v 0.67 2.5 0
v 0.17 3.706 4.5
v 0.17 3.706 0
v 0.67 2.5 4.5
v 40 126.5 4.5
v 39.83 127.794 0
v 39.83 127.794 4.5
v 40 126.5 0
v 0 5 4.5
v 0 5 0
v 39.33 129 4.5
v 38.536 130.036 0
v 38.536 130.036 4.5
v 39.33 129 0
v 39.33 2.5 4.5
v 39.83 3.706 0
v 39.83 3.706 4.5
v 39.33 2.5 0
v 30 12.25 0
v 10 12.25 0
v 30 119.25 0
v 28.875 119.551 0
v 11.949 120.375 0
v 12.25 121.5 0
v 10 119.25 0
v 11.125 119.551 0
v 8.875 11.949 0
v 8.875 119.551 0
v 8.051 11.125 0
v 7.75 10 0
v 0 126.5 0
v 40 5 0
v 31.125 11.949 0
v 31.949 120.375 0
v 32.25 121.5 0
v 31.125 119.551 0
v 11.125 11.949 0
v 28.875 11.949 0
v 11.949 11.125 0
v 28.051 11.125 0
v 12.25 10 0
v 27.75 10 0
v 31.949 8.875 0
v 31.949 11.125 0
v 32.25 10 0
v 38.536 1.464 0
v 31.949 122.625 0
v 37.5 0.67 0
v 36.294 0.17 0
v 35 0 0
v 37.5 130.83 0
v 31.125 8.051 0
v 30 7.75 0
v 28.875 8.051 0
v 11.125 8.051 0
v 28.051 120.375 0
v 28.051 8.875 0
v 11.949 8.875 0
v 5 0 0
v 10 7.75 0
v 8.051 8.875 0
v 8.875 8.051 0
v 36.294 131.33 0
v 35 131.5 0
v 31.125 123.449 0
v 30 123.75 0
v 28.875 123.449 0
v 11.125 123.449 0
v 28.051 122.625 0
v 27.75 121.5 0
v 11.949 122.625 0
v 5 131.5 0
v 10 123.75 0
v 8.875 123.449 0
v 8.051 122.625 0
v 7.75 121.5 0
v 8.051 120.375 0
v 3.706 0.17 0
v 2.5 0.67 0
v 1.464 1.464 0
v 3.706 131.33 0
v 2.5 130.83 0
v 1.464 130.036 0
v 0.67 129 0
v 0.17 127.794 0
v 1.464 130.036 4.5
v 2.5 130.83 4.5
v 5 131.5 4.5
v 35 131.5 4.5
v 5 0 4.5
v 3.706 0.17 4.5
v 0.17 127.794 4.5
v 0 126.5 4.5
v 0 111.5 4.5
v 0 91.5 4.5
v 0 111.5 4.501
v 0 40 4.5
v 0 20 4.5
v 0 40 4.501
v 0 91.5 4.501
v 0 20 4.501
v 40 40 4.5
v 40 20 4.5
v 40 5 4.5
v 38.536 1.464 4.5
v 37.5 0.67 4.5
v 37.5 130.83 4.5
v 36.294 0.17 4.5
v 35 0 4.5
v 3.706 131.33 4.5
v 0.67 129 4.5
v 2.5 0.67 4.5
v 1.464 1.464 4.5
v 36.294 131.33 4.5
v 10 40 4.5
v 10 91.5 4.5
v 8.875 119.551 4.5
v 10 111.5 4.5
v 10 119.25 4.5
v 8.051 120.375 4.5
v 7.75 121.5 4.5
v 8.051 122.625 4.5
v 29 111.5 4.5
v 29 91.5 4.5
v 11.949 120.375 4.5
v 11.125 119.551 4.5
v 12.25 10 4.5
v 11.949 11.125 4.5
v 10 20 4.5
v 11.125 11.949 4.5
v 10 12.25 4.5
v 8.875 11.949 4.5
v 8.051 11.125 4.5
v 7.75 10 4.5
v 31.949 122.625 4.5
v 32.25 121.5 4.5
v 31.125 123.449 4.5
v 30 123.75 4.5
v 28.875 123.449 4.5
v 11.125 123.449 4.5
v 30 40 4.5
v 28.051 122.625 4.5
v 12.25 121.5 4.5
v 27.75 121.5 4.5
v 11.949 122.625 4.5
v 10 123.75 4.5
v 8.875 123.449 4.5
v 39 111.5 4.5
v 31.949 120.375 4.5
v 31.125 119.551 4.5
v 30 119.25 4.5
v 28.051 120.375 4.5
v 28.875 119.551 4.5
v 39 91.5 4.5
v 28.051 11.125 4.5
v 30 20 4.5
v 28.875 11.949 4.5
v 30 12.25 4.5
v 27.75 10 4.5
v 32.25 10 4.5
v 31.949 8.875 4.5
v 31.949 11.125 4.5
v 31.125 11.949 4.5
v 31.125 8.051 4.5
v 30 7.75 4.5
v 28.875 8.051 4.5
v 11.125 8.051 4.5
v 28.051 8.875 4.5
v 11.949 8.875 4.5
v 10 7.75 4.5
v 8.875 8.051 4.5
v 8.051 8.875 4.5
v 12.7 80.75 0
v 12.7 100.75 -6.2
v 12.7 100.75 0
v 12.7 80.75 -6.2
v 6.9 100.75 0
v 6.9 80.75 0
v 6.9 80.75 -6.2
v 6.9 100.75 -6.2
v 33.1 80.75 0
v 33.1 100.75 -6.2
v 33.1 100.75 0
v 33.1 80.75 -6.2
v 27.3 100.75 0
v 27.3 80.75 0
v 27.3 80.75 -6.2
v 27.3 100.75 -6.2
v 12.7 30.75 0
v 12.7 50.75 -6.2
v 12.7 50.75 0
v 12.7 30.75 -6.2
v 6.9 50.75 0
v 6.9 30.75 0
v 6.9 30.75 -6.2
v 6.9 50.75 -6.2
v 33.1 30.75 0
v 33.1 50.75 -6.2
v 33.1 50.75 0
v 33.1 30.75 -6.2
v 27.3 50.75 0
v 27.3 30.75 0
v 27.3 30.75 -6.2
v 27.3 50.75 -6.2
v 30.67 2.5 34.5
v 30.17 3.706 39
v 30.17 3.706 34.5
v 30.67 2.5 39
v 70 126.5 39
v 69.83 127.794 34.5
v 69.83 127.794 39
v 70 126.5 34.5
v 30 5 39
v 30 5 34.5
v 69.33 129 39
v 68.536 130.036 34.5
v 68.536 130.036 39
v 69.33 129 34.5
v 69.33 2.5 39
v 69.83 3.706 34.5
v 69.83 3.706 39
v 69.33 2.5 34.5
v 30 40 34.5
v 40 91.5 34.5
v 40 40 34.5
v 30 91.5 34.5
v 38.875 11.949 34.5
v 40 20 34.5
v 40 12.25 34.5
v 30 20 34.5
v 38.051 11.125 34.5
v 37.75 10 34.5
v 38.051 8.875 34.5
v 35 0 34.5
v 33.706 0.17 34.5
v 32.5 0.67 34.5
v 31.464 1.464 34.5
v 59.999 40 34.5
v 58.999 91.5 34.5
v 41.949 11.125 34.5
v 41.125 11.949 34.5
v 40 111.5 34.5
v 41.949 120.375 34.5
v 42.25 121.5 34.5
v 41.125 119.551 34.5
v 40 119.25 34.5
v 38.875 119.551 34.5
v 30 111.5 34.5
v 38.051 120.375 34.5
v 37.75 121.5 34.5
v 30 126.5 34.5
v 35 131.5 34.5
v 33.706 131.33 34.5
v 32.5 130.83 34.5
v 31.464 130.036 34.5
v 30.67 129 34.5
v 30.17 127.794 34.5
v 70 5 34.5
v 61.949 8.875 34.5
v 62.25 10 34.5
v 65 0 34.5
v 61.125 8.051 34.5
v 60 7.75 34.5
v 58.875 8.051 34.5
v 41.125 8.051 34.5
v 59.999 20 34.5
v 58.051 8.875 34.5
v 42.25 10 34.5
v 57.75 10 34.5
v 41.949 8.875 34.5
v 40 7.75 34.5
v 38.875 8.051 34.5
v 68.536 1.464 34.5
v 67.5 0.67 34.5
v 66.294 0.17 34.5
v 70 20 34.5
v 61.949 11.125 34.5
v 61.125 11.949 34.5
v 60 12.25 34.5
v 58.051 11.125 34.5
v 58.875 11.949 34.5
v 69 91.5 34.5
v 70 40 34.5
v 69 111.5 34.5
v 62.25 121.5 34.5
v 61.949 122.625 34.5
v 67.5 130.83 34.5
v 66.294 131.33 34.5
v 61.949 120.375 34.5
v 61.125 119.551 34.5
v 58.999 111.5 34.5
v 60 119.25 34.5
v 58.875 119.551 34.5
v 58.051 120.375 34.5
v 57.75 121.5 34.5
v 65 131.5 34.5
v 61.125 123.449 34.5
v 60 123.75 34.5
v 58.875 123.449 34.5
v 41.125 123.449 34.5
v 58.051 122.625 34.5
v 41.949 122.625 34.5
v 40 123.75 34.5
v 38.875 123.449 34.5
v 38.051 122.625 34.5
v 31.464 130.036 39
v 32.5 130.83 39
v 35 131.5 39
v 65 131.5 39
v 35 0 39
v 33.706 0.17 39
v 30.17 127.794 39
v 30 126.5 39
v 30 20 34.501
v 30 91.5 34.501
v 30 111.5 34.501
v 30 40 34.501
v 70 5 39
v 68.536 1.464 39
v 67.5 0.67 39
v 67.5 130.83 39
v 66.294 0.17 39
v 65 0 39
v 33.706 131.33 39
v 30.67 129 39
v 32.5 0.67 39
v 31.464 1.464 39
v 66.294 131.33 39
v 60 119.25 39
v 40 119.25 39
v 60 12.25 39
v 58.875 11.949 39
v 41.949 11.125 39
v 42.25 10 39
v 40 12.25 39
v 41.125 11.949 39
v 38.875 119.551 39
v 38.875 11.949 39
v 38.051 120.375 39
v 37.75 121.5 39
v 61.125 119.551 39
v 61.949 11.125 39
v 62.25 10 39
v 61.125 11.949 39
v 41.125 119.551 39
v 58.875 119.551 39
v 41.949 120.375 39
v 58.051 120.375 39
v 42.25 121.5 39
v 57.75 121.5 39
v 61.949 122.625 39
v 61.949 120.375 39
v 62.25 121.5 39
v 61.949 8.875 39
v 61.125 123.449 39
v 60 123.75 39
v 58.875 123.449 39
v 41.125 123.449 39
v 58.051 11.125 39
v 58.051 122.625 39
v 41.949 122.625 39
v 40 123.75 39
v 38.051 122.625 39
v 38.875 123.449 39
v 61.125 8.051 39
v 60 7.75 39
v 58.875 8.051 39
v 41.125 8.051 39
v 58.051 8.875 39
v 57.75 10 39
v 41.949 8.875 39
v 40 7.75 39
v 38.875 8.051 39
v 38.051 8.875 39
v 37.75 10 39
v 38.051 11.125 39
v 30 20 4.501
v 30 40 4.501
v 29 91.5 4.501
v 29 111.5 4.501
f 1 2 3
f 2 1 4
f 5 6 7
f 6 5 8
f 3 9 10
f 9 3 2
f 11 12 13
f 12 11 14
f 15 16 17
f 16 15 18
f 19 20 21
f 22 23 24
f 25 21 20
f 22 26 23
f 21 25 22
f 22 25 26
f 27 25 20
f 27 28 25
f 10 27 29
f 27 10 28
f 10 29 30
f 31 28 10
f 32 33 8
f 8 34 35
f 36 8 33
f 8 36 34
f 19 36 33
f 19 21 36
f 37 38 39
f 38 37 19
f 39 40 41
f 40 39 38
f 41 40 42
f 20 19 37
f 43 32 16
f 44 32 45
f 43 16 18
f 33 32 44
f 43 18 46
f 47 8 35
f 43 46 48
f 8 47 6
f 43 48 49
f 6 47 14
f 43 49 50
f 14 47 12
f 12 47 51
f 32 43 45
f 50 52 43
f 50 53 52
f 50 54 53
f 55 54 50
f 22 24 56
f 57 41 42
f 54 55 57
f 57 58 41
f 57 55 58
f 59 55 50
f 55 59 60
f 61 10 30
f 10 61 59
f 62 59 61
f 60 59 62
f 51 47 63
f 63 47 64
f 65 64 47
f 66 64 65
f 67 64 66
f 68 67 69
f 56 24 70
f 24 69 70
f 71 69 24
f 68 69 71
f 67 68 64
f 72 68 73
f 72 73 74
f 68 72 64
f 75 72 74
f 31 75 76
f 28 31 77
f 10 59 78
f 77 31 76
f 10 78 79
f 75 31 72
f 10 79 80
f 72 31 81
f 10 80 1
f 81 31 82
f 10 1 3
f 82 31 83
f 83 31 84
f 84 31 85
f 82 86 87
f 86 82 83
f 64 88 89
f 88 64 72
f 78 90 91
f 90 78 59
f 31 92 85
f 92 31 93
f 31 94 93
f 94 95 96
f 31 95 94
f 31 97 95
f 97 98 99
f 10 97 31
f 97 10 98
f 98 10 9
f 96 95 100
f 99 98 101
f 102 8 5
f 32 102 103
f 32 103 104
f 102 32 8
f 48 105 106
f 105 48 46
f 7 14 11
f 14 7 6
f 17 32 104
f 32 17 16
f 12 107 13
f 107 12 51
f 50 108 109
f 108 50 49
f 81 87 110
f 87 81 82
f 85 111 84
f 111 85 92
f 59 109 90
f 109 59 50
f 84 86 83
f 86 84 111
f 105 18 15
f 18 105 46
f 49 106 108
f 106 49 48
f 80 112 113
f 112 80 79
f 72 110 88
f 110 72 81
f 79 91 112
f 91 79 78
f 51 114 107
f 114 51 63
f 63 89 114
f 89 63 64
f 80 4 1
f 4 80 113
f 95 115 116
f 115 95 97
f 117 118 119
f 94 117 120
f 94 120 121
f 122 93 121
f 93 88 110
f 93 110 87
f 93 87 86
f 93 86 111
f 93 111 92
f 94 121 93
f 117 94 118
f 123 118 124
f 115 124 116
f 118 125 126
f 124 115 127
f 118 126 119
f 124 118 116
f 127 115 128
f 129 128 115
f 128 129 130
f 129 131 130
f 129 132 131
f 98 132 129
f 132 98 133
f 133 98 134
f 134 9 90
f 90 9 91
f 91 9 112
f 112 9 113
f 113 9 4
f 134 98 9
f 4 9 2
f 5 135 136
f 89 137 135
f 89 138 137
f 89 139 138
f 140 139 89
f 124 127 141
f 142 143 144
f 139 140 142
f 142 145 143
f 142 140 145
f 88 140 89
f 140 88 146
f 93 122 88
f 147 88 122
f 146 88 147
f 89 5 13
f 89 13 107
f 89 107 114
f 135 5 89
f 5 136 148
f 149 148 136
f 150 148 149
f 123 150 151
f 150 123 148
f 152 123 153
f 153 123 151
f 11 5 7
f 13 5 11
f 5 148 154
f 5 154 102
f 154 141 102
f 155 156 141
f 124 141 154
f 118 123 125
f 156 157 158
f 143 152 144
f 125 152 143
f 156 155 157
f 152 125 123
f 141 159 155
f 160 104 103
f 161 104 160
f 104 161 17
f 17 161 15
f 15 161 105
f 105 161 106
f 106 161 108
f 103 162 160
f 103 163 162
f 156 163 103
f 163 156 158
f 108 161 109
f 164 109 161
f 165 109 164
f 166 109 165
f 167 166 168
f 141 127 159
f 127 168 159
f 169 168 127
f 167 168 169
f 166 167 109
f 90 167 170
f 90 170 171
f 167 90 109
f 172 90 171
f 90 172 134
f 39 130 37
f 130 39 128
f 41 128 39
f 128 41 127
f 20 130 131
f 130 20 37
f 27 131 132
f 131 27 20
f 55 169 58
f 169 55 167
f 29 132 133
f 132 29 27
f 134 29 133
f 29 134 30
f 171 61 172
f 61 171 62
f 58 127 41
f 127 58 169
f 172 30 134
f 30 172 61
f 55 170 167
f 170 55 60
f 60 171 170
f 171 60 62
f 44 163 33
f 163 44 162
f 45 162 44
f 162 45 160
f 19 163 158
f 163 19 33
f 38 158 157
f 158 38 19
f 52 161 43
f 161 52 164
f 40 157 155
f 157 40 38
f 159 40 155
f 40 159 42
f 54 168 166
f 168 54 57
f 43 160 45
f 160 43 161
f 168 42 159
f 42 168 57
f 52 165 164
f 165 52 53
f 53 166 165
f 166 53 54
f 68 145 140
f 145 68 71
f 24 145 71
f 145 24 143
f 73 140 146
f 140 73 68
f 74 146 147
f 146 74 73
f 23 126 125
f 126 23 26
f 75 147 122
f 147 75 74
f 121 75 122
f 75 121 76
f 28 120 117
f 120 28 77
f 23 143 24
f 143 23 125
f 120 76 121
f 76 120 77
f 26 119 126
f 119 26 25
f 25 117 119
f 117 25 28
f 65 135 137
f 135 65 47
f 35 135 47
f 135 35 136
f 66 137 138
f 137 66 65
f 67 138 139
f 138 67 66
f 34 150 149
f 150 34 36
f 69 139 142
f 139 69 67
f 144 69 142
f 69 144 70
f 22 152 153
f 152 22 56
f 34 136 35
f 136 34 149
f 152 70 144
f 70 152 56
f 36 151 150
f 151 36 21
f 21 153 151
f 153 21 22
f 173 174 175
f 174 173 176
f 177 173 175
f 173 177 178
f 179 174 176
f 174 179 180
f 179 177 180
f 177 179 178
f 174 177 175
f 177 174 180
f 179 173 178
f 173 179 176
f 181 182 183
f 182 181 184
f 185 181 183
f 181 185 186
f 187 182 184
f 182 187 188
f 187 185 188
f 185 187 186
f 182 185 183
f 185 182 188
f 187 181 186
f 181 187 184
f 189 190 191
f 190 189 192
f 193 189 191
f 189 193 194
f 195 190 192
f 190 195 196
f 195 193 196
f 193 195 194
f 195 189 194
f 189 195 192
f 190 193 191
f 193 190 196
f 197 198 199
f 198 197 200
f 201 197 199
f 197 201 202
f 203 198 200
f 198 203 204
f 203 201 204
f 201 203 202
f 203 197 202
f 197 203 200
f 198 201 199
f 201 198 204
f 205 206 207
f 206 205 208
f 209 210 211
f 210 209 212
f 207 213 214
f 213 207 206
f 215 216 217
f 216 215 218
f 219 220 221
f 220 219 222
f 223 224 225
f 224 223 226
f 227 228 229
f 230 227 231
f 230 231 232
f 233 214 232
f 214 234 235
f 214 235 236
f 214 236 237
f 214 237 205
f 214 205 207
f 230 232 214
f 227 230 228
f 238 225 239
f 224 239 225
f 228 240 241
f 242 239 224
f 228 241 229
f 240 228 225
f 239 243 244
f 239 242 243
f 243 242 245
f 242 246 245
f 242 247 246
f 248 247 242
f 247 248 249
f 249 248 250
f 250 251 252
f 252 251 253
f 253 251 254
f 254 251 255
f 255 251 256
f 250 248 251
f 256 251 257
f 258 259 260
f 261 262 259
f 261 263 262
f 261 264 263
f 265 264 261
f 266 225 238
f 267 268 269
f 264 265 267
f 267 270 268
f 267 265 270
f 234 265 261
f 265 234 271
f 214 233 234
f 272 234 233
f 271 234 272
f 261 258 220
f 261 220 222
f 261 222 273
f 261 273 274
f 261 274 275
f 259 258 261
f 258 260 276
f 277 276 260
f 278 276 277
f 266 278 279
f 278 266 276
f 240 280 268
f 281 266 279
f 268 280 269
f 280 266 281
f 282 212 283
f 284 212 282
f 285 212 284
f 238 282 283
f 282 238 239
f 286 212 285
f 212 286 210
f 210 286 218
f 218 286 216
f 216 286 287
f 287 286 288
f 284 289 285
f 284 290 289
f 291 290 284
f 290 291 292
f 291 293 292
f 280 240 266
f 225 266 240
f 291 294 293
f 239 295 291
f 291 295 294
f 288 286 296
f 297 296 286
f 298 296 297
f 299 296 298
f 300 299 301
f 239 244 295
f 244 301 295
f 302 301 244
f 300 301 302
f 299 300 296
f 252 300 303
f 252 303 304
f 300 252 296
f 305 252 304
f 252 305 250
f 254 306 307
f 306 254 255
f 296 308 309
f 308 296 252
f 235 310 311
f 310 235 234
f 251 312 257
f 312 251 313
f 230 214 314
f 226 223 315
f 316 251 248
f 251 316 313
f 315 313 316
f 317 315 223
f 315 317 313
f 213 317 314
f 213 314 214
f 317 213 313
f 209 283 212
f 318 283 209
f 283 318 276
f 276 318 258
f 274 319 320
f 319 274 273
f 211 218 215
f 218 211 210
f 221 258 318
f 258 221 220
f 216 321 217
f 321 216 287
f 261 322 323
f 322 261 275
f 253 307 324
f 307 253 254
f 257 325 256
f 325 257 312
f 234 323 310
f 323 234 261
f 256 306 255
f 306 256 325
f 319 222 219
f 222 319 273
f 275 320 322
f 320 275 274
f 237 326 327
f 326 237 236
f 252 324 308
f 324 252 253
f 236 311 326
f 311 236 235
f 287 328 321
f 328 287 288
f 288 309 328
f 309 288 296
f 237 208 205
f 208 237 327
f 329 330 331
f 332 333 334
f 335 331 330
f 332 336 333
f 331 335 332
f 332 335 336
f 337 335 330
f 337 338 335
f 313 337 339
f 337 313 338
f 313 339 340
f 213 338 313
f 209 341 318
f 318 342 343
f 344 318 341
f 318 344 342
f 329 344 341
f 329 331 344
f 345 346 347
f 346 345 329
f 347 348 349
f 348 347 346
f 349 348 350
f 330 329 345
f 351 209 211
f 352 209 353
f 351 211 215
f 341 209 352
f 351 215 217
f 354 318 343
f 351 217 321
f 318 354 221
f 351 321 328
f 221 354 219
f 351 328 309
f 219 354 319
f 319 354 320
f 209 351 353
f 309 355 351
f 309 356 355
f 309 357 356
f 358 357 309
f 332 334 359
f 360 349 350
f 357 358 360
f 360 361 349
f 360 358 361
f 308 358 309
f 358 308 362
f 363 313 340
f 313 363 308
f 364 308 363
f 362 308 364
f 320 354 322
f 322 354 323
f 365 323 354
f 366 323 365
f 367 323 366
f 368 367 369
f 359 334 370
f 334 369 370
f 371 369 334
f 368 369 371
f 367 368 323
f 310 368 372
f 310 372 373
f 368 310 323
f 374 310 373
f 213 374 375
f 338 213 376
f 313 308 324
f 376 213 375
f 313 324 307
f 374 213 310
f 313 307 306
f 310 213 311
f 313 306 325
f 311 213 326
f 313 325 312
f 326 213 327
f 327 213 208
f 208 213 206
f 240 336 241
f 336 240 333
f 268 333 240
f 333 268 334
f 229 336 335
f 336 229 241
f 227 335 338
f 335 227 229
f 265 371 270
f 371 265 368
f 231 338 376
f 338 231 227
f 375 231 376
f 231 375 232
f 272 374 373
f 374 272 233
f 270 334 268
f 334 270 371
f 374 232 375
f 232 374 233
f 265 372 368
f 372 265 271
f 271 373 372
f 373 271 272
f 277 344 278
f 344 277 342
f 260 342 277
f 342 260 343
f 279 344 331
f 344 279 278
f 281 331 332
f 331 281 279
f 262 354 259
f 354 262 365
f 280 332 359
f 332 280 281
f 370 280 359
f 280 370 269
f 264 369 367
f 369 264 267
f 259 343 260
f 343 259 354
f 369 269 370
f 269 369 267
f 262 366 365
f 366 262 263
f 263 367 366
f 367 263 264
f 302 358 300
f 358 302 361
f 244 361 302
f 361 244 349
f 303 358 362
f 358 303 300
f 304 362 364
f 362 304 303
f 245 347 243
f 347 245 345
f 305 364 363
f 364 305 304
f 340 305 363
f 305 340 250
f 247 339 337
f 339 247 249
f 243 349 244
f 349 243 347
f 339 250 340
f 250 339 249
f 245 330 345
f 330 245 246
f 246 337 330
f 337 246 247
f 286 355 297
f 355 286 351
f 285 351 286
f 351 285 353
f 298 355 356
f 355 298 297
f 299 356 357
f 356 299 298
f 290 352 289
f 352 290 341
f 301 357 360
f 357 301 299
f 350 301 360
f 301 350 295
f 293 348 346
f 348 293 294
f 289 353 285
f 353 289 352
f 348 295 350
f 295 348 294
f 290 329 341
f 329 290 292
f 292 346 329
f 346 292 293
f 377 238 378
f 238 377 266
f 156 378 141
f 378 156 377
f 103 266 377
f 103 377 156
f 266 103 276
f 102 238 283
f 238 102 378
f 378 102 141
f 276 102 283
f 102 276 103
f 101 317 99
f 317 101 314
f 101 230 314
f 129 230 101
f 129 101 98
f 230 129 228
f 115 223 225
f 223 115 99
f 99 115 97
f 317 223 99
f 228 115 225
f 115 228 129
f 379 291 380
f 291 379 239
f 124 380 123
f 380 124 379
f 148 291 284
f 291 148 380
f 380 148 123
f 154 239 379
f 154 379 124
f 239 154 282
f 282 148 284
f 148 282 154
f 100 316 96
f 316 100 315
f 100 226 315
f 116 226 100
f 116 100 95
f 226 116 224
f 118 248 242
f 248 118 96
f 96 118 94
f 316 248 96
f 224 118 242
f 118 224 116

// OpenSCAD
/* https://www.thingiverse.com/thing:2164045 */
// preview[view:south west, tilt:top diagonal]

// Add prongs to the bottom of the mount for additional stability
use_prongs = "yes"; // [yes:Yes, no:No]

// X-offset of the mount
offset_x = 30;
// Y-offset of the mount
offset_y = 0;
// Z-offset of the mount
offset_z = 30;

// Arm height
arm_height = 20;
// Arm width
arm_width = 10;

// Make M4 holes a bit larger, added to the diameter
m4_hole_adjustment = 0.5;

/* [Hidden] */

alu_w = 20.0;
alu_m = 6.2; // The middle groove of the 2020 extrusion
alu_side_w = (alu_w - alu_m) / 2;

base_w = alu_w * 2;
base_l = 131.5; // TEVO Tarantula i3
base_h =  4.5;

arm_y_margin = 20;

m4_d = 4.0 + m4_hole_adjustment;

extender();

module plate() {
    difference() {
        linear_extrude(height=base_h) rounded_square([base_w, base_l], 5, $fn=24);
        
        hm = alu_side_w + alu_m/2;
        ox = hm;
        oy = 10;
        translate([ox,oy,-1]) cylinder(d=m4_d, h=base_h+2, $fn=12);
        translate([base_w-ox,oy,-1]) cylinder(d=m4_d, h=base_h+2, $fn=12);
        
        translate([ox,base_l-oy,-1]) cylinder(d=m4_d, h=base_h+2, $fn=12);
        translate([base_w-ox,base_l-oy,-1]) cylinder(d=m4_d, h=base_h+2, $fn=12);
    }
}

module extender() {
    plate(); // Base
    
    // Prongs
    if (use_prongs == "yes") {
        translate([0, (base_l)/2, -alu_m]) {
            prongs();
        }
    }
    
    // Bottom right
    translate([base_w-10, arm_y_margin, base_h])
        arm();
    // Bottom left
    translate([0, arm_y_margin, base_h])
        arm();
    
    // Top right
    translate([base_w-10-1, base_l-arm_height-arm_y_margin, base_h])
        arm();
    // Top left
    translate([0, base_l-arm_height-arm_y_margin, base_h])
        arm();
    
    // Top plate
    translate([offset_x, offset_y, offset_z + base_h]) 
        plate();
}

module arm() {
    hull() {
        translate([0, 0, 0]) cube([arm_width, arm_height, 0.001]);
        translate([offset_x, offset_y, offset_z]) 
            cube([arm_width, arm_height, 0.001]);
    }
}
module prongs() {
    module pair() {
        p_w = alu_m - 0.4; // Width of a prong
        p_h = 20; // Height
        translate([alu_side_w, 0])
            cube([p_w, p_h, alu_m]);
        
        translate([base_w-alu_side_w-p_w, 0])
            cube([p_w, p_h, alu_m]);
    }
    translate([0,15]) pair();
    mirror([0,1,0]) translate([0,15]) pair();
}

/* Utils */
module rounded_square(size, radius=6, center=false) {
    w = size[0];
    h = size[1];
    
    gx = center ? 0 : w/2;
    gy = center ? 0 : h/2;
    
    hw = w/2;
    hh = h/2;
    hull()
    {
        // place 4 circles in the corners, with the given radius
        translate([gx-hw+radius, gy+hh-radius, 0]) // TL
            circle(r=radius);
        
        translate([gx+hw-radius, gy+hh-radius, 0]) // TR
            circle(r=radius);
        
        translate([gx+hw-radius, gy-hh+radius, 0]) // BR
            circle(r=radius);
        
        translate([gx-hw+radius, gy-hh+radius, 0]) // BL
            circle(r=radius);
    }
}
